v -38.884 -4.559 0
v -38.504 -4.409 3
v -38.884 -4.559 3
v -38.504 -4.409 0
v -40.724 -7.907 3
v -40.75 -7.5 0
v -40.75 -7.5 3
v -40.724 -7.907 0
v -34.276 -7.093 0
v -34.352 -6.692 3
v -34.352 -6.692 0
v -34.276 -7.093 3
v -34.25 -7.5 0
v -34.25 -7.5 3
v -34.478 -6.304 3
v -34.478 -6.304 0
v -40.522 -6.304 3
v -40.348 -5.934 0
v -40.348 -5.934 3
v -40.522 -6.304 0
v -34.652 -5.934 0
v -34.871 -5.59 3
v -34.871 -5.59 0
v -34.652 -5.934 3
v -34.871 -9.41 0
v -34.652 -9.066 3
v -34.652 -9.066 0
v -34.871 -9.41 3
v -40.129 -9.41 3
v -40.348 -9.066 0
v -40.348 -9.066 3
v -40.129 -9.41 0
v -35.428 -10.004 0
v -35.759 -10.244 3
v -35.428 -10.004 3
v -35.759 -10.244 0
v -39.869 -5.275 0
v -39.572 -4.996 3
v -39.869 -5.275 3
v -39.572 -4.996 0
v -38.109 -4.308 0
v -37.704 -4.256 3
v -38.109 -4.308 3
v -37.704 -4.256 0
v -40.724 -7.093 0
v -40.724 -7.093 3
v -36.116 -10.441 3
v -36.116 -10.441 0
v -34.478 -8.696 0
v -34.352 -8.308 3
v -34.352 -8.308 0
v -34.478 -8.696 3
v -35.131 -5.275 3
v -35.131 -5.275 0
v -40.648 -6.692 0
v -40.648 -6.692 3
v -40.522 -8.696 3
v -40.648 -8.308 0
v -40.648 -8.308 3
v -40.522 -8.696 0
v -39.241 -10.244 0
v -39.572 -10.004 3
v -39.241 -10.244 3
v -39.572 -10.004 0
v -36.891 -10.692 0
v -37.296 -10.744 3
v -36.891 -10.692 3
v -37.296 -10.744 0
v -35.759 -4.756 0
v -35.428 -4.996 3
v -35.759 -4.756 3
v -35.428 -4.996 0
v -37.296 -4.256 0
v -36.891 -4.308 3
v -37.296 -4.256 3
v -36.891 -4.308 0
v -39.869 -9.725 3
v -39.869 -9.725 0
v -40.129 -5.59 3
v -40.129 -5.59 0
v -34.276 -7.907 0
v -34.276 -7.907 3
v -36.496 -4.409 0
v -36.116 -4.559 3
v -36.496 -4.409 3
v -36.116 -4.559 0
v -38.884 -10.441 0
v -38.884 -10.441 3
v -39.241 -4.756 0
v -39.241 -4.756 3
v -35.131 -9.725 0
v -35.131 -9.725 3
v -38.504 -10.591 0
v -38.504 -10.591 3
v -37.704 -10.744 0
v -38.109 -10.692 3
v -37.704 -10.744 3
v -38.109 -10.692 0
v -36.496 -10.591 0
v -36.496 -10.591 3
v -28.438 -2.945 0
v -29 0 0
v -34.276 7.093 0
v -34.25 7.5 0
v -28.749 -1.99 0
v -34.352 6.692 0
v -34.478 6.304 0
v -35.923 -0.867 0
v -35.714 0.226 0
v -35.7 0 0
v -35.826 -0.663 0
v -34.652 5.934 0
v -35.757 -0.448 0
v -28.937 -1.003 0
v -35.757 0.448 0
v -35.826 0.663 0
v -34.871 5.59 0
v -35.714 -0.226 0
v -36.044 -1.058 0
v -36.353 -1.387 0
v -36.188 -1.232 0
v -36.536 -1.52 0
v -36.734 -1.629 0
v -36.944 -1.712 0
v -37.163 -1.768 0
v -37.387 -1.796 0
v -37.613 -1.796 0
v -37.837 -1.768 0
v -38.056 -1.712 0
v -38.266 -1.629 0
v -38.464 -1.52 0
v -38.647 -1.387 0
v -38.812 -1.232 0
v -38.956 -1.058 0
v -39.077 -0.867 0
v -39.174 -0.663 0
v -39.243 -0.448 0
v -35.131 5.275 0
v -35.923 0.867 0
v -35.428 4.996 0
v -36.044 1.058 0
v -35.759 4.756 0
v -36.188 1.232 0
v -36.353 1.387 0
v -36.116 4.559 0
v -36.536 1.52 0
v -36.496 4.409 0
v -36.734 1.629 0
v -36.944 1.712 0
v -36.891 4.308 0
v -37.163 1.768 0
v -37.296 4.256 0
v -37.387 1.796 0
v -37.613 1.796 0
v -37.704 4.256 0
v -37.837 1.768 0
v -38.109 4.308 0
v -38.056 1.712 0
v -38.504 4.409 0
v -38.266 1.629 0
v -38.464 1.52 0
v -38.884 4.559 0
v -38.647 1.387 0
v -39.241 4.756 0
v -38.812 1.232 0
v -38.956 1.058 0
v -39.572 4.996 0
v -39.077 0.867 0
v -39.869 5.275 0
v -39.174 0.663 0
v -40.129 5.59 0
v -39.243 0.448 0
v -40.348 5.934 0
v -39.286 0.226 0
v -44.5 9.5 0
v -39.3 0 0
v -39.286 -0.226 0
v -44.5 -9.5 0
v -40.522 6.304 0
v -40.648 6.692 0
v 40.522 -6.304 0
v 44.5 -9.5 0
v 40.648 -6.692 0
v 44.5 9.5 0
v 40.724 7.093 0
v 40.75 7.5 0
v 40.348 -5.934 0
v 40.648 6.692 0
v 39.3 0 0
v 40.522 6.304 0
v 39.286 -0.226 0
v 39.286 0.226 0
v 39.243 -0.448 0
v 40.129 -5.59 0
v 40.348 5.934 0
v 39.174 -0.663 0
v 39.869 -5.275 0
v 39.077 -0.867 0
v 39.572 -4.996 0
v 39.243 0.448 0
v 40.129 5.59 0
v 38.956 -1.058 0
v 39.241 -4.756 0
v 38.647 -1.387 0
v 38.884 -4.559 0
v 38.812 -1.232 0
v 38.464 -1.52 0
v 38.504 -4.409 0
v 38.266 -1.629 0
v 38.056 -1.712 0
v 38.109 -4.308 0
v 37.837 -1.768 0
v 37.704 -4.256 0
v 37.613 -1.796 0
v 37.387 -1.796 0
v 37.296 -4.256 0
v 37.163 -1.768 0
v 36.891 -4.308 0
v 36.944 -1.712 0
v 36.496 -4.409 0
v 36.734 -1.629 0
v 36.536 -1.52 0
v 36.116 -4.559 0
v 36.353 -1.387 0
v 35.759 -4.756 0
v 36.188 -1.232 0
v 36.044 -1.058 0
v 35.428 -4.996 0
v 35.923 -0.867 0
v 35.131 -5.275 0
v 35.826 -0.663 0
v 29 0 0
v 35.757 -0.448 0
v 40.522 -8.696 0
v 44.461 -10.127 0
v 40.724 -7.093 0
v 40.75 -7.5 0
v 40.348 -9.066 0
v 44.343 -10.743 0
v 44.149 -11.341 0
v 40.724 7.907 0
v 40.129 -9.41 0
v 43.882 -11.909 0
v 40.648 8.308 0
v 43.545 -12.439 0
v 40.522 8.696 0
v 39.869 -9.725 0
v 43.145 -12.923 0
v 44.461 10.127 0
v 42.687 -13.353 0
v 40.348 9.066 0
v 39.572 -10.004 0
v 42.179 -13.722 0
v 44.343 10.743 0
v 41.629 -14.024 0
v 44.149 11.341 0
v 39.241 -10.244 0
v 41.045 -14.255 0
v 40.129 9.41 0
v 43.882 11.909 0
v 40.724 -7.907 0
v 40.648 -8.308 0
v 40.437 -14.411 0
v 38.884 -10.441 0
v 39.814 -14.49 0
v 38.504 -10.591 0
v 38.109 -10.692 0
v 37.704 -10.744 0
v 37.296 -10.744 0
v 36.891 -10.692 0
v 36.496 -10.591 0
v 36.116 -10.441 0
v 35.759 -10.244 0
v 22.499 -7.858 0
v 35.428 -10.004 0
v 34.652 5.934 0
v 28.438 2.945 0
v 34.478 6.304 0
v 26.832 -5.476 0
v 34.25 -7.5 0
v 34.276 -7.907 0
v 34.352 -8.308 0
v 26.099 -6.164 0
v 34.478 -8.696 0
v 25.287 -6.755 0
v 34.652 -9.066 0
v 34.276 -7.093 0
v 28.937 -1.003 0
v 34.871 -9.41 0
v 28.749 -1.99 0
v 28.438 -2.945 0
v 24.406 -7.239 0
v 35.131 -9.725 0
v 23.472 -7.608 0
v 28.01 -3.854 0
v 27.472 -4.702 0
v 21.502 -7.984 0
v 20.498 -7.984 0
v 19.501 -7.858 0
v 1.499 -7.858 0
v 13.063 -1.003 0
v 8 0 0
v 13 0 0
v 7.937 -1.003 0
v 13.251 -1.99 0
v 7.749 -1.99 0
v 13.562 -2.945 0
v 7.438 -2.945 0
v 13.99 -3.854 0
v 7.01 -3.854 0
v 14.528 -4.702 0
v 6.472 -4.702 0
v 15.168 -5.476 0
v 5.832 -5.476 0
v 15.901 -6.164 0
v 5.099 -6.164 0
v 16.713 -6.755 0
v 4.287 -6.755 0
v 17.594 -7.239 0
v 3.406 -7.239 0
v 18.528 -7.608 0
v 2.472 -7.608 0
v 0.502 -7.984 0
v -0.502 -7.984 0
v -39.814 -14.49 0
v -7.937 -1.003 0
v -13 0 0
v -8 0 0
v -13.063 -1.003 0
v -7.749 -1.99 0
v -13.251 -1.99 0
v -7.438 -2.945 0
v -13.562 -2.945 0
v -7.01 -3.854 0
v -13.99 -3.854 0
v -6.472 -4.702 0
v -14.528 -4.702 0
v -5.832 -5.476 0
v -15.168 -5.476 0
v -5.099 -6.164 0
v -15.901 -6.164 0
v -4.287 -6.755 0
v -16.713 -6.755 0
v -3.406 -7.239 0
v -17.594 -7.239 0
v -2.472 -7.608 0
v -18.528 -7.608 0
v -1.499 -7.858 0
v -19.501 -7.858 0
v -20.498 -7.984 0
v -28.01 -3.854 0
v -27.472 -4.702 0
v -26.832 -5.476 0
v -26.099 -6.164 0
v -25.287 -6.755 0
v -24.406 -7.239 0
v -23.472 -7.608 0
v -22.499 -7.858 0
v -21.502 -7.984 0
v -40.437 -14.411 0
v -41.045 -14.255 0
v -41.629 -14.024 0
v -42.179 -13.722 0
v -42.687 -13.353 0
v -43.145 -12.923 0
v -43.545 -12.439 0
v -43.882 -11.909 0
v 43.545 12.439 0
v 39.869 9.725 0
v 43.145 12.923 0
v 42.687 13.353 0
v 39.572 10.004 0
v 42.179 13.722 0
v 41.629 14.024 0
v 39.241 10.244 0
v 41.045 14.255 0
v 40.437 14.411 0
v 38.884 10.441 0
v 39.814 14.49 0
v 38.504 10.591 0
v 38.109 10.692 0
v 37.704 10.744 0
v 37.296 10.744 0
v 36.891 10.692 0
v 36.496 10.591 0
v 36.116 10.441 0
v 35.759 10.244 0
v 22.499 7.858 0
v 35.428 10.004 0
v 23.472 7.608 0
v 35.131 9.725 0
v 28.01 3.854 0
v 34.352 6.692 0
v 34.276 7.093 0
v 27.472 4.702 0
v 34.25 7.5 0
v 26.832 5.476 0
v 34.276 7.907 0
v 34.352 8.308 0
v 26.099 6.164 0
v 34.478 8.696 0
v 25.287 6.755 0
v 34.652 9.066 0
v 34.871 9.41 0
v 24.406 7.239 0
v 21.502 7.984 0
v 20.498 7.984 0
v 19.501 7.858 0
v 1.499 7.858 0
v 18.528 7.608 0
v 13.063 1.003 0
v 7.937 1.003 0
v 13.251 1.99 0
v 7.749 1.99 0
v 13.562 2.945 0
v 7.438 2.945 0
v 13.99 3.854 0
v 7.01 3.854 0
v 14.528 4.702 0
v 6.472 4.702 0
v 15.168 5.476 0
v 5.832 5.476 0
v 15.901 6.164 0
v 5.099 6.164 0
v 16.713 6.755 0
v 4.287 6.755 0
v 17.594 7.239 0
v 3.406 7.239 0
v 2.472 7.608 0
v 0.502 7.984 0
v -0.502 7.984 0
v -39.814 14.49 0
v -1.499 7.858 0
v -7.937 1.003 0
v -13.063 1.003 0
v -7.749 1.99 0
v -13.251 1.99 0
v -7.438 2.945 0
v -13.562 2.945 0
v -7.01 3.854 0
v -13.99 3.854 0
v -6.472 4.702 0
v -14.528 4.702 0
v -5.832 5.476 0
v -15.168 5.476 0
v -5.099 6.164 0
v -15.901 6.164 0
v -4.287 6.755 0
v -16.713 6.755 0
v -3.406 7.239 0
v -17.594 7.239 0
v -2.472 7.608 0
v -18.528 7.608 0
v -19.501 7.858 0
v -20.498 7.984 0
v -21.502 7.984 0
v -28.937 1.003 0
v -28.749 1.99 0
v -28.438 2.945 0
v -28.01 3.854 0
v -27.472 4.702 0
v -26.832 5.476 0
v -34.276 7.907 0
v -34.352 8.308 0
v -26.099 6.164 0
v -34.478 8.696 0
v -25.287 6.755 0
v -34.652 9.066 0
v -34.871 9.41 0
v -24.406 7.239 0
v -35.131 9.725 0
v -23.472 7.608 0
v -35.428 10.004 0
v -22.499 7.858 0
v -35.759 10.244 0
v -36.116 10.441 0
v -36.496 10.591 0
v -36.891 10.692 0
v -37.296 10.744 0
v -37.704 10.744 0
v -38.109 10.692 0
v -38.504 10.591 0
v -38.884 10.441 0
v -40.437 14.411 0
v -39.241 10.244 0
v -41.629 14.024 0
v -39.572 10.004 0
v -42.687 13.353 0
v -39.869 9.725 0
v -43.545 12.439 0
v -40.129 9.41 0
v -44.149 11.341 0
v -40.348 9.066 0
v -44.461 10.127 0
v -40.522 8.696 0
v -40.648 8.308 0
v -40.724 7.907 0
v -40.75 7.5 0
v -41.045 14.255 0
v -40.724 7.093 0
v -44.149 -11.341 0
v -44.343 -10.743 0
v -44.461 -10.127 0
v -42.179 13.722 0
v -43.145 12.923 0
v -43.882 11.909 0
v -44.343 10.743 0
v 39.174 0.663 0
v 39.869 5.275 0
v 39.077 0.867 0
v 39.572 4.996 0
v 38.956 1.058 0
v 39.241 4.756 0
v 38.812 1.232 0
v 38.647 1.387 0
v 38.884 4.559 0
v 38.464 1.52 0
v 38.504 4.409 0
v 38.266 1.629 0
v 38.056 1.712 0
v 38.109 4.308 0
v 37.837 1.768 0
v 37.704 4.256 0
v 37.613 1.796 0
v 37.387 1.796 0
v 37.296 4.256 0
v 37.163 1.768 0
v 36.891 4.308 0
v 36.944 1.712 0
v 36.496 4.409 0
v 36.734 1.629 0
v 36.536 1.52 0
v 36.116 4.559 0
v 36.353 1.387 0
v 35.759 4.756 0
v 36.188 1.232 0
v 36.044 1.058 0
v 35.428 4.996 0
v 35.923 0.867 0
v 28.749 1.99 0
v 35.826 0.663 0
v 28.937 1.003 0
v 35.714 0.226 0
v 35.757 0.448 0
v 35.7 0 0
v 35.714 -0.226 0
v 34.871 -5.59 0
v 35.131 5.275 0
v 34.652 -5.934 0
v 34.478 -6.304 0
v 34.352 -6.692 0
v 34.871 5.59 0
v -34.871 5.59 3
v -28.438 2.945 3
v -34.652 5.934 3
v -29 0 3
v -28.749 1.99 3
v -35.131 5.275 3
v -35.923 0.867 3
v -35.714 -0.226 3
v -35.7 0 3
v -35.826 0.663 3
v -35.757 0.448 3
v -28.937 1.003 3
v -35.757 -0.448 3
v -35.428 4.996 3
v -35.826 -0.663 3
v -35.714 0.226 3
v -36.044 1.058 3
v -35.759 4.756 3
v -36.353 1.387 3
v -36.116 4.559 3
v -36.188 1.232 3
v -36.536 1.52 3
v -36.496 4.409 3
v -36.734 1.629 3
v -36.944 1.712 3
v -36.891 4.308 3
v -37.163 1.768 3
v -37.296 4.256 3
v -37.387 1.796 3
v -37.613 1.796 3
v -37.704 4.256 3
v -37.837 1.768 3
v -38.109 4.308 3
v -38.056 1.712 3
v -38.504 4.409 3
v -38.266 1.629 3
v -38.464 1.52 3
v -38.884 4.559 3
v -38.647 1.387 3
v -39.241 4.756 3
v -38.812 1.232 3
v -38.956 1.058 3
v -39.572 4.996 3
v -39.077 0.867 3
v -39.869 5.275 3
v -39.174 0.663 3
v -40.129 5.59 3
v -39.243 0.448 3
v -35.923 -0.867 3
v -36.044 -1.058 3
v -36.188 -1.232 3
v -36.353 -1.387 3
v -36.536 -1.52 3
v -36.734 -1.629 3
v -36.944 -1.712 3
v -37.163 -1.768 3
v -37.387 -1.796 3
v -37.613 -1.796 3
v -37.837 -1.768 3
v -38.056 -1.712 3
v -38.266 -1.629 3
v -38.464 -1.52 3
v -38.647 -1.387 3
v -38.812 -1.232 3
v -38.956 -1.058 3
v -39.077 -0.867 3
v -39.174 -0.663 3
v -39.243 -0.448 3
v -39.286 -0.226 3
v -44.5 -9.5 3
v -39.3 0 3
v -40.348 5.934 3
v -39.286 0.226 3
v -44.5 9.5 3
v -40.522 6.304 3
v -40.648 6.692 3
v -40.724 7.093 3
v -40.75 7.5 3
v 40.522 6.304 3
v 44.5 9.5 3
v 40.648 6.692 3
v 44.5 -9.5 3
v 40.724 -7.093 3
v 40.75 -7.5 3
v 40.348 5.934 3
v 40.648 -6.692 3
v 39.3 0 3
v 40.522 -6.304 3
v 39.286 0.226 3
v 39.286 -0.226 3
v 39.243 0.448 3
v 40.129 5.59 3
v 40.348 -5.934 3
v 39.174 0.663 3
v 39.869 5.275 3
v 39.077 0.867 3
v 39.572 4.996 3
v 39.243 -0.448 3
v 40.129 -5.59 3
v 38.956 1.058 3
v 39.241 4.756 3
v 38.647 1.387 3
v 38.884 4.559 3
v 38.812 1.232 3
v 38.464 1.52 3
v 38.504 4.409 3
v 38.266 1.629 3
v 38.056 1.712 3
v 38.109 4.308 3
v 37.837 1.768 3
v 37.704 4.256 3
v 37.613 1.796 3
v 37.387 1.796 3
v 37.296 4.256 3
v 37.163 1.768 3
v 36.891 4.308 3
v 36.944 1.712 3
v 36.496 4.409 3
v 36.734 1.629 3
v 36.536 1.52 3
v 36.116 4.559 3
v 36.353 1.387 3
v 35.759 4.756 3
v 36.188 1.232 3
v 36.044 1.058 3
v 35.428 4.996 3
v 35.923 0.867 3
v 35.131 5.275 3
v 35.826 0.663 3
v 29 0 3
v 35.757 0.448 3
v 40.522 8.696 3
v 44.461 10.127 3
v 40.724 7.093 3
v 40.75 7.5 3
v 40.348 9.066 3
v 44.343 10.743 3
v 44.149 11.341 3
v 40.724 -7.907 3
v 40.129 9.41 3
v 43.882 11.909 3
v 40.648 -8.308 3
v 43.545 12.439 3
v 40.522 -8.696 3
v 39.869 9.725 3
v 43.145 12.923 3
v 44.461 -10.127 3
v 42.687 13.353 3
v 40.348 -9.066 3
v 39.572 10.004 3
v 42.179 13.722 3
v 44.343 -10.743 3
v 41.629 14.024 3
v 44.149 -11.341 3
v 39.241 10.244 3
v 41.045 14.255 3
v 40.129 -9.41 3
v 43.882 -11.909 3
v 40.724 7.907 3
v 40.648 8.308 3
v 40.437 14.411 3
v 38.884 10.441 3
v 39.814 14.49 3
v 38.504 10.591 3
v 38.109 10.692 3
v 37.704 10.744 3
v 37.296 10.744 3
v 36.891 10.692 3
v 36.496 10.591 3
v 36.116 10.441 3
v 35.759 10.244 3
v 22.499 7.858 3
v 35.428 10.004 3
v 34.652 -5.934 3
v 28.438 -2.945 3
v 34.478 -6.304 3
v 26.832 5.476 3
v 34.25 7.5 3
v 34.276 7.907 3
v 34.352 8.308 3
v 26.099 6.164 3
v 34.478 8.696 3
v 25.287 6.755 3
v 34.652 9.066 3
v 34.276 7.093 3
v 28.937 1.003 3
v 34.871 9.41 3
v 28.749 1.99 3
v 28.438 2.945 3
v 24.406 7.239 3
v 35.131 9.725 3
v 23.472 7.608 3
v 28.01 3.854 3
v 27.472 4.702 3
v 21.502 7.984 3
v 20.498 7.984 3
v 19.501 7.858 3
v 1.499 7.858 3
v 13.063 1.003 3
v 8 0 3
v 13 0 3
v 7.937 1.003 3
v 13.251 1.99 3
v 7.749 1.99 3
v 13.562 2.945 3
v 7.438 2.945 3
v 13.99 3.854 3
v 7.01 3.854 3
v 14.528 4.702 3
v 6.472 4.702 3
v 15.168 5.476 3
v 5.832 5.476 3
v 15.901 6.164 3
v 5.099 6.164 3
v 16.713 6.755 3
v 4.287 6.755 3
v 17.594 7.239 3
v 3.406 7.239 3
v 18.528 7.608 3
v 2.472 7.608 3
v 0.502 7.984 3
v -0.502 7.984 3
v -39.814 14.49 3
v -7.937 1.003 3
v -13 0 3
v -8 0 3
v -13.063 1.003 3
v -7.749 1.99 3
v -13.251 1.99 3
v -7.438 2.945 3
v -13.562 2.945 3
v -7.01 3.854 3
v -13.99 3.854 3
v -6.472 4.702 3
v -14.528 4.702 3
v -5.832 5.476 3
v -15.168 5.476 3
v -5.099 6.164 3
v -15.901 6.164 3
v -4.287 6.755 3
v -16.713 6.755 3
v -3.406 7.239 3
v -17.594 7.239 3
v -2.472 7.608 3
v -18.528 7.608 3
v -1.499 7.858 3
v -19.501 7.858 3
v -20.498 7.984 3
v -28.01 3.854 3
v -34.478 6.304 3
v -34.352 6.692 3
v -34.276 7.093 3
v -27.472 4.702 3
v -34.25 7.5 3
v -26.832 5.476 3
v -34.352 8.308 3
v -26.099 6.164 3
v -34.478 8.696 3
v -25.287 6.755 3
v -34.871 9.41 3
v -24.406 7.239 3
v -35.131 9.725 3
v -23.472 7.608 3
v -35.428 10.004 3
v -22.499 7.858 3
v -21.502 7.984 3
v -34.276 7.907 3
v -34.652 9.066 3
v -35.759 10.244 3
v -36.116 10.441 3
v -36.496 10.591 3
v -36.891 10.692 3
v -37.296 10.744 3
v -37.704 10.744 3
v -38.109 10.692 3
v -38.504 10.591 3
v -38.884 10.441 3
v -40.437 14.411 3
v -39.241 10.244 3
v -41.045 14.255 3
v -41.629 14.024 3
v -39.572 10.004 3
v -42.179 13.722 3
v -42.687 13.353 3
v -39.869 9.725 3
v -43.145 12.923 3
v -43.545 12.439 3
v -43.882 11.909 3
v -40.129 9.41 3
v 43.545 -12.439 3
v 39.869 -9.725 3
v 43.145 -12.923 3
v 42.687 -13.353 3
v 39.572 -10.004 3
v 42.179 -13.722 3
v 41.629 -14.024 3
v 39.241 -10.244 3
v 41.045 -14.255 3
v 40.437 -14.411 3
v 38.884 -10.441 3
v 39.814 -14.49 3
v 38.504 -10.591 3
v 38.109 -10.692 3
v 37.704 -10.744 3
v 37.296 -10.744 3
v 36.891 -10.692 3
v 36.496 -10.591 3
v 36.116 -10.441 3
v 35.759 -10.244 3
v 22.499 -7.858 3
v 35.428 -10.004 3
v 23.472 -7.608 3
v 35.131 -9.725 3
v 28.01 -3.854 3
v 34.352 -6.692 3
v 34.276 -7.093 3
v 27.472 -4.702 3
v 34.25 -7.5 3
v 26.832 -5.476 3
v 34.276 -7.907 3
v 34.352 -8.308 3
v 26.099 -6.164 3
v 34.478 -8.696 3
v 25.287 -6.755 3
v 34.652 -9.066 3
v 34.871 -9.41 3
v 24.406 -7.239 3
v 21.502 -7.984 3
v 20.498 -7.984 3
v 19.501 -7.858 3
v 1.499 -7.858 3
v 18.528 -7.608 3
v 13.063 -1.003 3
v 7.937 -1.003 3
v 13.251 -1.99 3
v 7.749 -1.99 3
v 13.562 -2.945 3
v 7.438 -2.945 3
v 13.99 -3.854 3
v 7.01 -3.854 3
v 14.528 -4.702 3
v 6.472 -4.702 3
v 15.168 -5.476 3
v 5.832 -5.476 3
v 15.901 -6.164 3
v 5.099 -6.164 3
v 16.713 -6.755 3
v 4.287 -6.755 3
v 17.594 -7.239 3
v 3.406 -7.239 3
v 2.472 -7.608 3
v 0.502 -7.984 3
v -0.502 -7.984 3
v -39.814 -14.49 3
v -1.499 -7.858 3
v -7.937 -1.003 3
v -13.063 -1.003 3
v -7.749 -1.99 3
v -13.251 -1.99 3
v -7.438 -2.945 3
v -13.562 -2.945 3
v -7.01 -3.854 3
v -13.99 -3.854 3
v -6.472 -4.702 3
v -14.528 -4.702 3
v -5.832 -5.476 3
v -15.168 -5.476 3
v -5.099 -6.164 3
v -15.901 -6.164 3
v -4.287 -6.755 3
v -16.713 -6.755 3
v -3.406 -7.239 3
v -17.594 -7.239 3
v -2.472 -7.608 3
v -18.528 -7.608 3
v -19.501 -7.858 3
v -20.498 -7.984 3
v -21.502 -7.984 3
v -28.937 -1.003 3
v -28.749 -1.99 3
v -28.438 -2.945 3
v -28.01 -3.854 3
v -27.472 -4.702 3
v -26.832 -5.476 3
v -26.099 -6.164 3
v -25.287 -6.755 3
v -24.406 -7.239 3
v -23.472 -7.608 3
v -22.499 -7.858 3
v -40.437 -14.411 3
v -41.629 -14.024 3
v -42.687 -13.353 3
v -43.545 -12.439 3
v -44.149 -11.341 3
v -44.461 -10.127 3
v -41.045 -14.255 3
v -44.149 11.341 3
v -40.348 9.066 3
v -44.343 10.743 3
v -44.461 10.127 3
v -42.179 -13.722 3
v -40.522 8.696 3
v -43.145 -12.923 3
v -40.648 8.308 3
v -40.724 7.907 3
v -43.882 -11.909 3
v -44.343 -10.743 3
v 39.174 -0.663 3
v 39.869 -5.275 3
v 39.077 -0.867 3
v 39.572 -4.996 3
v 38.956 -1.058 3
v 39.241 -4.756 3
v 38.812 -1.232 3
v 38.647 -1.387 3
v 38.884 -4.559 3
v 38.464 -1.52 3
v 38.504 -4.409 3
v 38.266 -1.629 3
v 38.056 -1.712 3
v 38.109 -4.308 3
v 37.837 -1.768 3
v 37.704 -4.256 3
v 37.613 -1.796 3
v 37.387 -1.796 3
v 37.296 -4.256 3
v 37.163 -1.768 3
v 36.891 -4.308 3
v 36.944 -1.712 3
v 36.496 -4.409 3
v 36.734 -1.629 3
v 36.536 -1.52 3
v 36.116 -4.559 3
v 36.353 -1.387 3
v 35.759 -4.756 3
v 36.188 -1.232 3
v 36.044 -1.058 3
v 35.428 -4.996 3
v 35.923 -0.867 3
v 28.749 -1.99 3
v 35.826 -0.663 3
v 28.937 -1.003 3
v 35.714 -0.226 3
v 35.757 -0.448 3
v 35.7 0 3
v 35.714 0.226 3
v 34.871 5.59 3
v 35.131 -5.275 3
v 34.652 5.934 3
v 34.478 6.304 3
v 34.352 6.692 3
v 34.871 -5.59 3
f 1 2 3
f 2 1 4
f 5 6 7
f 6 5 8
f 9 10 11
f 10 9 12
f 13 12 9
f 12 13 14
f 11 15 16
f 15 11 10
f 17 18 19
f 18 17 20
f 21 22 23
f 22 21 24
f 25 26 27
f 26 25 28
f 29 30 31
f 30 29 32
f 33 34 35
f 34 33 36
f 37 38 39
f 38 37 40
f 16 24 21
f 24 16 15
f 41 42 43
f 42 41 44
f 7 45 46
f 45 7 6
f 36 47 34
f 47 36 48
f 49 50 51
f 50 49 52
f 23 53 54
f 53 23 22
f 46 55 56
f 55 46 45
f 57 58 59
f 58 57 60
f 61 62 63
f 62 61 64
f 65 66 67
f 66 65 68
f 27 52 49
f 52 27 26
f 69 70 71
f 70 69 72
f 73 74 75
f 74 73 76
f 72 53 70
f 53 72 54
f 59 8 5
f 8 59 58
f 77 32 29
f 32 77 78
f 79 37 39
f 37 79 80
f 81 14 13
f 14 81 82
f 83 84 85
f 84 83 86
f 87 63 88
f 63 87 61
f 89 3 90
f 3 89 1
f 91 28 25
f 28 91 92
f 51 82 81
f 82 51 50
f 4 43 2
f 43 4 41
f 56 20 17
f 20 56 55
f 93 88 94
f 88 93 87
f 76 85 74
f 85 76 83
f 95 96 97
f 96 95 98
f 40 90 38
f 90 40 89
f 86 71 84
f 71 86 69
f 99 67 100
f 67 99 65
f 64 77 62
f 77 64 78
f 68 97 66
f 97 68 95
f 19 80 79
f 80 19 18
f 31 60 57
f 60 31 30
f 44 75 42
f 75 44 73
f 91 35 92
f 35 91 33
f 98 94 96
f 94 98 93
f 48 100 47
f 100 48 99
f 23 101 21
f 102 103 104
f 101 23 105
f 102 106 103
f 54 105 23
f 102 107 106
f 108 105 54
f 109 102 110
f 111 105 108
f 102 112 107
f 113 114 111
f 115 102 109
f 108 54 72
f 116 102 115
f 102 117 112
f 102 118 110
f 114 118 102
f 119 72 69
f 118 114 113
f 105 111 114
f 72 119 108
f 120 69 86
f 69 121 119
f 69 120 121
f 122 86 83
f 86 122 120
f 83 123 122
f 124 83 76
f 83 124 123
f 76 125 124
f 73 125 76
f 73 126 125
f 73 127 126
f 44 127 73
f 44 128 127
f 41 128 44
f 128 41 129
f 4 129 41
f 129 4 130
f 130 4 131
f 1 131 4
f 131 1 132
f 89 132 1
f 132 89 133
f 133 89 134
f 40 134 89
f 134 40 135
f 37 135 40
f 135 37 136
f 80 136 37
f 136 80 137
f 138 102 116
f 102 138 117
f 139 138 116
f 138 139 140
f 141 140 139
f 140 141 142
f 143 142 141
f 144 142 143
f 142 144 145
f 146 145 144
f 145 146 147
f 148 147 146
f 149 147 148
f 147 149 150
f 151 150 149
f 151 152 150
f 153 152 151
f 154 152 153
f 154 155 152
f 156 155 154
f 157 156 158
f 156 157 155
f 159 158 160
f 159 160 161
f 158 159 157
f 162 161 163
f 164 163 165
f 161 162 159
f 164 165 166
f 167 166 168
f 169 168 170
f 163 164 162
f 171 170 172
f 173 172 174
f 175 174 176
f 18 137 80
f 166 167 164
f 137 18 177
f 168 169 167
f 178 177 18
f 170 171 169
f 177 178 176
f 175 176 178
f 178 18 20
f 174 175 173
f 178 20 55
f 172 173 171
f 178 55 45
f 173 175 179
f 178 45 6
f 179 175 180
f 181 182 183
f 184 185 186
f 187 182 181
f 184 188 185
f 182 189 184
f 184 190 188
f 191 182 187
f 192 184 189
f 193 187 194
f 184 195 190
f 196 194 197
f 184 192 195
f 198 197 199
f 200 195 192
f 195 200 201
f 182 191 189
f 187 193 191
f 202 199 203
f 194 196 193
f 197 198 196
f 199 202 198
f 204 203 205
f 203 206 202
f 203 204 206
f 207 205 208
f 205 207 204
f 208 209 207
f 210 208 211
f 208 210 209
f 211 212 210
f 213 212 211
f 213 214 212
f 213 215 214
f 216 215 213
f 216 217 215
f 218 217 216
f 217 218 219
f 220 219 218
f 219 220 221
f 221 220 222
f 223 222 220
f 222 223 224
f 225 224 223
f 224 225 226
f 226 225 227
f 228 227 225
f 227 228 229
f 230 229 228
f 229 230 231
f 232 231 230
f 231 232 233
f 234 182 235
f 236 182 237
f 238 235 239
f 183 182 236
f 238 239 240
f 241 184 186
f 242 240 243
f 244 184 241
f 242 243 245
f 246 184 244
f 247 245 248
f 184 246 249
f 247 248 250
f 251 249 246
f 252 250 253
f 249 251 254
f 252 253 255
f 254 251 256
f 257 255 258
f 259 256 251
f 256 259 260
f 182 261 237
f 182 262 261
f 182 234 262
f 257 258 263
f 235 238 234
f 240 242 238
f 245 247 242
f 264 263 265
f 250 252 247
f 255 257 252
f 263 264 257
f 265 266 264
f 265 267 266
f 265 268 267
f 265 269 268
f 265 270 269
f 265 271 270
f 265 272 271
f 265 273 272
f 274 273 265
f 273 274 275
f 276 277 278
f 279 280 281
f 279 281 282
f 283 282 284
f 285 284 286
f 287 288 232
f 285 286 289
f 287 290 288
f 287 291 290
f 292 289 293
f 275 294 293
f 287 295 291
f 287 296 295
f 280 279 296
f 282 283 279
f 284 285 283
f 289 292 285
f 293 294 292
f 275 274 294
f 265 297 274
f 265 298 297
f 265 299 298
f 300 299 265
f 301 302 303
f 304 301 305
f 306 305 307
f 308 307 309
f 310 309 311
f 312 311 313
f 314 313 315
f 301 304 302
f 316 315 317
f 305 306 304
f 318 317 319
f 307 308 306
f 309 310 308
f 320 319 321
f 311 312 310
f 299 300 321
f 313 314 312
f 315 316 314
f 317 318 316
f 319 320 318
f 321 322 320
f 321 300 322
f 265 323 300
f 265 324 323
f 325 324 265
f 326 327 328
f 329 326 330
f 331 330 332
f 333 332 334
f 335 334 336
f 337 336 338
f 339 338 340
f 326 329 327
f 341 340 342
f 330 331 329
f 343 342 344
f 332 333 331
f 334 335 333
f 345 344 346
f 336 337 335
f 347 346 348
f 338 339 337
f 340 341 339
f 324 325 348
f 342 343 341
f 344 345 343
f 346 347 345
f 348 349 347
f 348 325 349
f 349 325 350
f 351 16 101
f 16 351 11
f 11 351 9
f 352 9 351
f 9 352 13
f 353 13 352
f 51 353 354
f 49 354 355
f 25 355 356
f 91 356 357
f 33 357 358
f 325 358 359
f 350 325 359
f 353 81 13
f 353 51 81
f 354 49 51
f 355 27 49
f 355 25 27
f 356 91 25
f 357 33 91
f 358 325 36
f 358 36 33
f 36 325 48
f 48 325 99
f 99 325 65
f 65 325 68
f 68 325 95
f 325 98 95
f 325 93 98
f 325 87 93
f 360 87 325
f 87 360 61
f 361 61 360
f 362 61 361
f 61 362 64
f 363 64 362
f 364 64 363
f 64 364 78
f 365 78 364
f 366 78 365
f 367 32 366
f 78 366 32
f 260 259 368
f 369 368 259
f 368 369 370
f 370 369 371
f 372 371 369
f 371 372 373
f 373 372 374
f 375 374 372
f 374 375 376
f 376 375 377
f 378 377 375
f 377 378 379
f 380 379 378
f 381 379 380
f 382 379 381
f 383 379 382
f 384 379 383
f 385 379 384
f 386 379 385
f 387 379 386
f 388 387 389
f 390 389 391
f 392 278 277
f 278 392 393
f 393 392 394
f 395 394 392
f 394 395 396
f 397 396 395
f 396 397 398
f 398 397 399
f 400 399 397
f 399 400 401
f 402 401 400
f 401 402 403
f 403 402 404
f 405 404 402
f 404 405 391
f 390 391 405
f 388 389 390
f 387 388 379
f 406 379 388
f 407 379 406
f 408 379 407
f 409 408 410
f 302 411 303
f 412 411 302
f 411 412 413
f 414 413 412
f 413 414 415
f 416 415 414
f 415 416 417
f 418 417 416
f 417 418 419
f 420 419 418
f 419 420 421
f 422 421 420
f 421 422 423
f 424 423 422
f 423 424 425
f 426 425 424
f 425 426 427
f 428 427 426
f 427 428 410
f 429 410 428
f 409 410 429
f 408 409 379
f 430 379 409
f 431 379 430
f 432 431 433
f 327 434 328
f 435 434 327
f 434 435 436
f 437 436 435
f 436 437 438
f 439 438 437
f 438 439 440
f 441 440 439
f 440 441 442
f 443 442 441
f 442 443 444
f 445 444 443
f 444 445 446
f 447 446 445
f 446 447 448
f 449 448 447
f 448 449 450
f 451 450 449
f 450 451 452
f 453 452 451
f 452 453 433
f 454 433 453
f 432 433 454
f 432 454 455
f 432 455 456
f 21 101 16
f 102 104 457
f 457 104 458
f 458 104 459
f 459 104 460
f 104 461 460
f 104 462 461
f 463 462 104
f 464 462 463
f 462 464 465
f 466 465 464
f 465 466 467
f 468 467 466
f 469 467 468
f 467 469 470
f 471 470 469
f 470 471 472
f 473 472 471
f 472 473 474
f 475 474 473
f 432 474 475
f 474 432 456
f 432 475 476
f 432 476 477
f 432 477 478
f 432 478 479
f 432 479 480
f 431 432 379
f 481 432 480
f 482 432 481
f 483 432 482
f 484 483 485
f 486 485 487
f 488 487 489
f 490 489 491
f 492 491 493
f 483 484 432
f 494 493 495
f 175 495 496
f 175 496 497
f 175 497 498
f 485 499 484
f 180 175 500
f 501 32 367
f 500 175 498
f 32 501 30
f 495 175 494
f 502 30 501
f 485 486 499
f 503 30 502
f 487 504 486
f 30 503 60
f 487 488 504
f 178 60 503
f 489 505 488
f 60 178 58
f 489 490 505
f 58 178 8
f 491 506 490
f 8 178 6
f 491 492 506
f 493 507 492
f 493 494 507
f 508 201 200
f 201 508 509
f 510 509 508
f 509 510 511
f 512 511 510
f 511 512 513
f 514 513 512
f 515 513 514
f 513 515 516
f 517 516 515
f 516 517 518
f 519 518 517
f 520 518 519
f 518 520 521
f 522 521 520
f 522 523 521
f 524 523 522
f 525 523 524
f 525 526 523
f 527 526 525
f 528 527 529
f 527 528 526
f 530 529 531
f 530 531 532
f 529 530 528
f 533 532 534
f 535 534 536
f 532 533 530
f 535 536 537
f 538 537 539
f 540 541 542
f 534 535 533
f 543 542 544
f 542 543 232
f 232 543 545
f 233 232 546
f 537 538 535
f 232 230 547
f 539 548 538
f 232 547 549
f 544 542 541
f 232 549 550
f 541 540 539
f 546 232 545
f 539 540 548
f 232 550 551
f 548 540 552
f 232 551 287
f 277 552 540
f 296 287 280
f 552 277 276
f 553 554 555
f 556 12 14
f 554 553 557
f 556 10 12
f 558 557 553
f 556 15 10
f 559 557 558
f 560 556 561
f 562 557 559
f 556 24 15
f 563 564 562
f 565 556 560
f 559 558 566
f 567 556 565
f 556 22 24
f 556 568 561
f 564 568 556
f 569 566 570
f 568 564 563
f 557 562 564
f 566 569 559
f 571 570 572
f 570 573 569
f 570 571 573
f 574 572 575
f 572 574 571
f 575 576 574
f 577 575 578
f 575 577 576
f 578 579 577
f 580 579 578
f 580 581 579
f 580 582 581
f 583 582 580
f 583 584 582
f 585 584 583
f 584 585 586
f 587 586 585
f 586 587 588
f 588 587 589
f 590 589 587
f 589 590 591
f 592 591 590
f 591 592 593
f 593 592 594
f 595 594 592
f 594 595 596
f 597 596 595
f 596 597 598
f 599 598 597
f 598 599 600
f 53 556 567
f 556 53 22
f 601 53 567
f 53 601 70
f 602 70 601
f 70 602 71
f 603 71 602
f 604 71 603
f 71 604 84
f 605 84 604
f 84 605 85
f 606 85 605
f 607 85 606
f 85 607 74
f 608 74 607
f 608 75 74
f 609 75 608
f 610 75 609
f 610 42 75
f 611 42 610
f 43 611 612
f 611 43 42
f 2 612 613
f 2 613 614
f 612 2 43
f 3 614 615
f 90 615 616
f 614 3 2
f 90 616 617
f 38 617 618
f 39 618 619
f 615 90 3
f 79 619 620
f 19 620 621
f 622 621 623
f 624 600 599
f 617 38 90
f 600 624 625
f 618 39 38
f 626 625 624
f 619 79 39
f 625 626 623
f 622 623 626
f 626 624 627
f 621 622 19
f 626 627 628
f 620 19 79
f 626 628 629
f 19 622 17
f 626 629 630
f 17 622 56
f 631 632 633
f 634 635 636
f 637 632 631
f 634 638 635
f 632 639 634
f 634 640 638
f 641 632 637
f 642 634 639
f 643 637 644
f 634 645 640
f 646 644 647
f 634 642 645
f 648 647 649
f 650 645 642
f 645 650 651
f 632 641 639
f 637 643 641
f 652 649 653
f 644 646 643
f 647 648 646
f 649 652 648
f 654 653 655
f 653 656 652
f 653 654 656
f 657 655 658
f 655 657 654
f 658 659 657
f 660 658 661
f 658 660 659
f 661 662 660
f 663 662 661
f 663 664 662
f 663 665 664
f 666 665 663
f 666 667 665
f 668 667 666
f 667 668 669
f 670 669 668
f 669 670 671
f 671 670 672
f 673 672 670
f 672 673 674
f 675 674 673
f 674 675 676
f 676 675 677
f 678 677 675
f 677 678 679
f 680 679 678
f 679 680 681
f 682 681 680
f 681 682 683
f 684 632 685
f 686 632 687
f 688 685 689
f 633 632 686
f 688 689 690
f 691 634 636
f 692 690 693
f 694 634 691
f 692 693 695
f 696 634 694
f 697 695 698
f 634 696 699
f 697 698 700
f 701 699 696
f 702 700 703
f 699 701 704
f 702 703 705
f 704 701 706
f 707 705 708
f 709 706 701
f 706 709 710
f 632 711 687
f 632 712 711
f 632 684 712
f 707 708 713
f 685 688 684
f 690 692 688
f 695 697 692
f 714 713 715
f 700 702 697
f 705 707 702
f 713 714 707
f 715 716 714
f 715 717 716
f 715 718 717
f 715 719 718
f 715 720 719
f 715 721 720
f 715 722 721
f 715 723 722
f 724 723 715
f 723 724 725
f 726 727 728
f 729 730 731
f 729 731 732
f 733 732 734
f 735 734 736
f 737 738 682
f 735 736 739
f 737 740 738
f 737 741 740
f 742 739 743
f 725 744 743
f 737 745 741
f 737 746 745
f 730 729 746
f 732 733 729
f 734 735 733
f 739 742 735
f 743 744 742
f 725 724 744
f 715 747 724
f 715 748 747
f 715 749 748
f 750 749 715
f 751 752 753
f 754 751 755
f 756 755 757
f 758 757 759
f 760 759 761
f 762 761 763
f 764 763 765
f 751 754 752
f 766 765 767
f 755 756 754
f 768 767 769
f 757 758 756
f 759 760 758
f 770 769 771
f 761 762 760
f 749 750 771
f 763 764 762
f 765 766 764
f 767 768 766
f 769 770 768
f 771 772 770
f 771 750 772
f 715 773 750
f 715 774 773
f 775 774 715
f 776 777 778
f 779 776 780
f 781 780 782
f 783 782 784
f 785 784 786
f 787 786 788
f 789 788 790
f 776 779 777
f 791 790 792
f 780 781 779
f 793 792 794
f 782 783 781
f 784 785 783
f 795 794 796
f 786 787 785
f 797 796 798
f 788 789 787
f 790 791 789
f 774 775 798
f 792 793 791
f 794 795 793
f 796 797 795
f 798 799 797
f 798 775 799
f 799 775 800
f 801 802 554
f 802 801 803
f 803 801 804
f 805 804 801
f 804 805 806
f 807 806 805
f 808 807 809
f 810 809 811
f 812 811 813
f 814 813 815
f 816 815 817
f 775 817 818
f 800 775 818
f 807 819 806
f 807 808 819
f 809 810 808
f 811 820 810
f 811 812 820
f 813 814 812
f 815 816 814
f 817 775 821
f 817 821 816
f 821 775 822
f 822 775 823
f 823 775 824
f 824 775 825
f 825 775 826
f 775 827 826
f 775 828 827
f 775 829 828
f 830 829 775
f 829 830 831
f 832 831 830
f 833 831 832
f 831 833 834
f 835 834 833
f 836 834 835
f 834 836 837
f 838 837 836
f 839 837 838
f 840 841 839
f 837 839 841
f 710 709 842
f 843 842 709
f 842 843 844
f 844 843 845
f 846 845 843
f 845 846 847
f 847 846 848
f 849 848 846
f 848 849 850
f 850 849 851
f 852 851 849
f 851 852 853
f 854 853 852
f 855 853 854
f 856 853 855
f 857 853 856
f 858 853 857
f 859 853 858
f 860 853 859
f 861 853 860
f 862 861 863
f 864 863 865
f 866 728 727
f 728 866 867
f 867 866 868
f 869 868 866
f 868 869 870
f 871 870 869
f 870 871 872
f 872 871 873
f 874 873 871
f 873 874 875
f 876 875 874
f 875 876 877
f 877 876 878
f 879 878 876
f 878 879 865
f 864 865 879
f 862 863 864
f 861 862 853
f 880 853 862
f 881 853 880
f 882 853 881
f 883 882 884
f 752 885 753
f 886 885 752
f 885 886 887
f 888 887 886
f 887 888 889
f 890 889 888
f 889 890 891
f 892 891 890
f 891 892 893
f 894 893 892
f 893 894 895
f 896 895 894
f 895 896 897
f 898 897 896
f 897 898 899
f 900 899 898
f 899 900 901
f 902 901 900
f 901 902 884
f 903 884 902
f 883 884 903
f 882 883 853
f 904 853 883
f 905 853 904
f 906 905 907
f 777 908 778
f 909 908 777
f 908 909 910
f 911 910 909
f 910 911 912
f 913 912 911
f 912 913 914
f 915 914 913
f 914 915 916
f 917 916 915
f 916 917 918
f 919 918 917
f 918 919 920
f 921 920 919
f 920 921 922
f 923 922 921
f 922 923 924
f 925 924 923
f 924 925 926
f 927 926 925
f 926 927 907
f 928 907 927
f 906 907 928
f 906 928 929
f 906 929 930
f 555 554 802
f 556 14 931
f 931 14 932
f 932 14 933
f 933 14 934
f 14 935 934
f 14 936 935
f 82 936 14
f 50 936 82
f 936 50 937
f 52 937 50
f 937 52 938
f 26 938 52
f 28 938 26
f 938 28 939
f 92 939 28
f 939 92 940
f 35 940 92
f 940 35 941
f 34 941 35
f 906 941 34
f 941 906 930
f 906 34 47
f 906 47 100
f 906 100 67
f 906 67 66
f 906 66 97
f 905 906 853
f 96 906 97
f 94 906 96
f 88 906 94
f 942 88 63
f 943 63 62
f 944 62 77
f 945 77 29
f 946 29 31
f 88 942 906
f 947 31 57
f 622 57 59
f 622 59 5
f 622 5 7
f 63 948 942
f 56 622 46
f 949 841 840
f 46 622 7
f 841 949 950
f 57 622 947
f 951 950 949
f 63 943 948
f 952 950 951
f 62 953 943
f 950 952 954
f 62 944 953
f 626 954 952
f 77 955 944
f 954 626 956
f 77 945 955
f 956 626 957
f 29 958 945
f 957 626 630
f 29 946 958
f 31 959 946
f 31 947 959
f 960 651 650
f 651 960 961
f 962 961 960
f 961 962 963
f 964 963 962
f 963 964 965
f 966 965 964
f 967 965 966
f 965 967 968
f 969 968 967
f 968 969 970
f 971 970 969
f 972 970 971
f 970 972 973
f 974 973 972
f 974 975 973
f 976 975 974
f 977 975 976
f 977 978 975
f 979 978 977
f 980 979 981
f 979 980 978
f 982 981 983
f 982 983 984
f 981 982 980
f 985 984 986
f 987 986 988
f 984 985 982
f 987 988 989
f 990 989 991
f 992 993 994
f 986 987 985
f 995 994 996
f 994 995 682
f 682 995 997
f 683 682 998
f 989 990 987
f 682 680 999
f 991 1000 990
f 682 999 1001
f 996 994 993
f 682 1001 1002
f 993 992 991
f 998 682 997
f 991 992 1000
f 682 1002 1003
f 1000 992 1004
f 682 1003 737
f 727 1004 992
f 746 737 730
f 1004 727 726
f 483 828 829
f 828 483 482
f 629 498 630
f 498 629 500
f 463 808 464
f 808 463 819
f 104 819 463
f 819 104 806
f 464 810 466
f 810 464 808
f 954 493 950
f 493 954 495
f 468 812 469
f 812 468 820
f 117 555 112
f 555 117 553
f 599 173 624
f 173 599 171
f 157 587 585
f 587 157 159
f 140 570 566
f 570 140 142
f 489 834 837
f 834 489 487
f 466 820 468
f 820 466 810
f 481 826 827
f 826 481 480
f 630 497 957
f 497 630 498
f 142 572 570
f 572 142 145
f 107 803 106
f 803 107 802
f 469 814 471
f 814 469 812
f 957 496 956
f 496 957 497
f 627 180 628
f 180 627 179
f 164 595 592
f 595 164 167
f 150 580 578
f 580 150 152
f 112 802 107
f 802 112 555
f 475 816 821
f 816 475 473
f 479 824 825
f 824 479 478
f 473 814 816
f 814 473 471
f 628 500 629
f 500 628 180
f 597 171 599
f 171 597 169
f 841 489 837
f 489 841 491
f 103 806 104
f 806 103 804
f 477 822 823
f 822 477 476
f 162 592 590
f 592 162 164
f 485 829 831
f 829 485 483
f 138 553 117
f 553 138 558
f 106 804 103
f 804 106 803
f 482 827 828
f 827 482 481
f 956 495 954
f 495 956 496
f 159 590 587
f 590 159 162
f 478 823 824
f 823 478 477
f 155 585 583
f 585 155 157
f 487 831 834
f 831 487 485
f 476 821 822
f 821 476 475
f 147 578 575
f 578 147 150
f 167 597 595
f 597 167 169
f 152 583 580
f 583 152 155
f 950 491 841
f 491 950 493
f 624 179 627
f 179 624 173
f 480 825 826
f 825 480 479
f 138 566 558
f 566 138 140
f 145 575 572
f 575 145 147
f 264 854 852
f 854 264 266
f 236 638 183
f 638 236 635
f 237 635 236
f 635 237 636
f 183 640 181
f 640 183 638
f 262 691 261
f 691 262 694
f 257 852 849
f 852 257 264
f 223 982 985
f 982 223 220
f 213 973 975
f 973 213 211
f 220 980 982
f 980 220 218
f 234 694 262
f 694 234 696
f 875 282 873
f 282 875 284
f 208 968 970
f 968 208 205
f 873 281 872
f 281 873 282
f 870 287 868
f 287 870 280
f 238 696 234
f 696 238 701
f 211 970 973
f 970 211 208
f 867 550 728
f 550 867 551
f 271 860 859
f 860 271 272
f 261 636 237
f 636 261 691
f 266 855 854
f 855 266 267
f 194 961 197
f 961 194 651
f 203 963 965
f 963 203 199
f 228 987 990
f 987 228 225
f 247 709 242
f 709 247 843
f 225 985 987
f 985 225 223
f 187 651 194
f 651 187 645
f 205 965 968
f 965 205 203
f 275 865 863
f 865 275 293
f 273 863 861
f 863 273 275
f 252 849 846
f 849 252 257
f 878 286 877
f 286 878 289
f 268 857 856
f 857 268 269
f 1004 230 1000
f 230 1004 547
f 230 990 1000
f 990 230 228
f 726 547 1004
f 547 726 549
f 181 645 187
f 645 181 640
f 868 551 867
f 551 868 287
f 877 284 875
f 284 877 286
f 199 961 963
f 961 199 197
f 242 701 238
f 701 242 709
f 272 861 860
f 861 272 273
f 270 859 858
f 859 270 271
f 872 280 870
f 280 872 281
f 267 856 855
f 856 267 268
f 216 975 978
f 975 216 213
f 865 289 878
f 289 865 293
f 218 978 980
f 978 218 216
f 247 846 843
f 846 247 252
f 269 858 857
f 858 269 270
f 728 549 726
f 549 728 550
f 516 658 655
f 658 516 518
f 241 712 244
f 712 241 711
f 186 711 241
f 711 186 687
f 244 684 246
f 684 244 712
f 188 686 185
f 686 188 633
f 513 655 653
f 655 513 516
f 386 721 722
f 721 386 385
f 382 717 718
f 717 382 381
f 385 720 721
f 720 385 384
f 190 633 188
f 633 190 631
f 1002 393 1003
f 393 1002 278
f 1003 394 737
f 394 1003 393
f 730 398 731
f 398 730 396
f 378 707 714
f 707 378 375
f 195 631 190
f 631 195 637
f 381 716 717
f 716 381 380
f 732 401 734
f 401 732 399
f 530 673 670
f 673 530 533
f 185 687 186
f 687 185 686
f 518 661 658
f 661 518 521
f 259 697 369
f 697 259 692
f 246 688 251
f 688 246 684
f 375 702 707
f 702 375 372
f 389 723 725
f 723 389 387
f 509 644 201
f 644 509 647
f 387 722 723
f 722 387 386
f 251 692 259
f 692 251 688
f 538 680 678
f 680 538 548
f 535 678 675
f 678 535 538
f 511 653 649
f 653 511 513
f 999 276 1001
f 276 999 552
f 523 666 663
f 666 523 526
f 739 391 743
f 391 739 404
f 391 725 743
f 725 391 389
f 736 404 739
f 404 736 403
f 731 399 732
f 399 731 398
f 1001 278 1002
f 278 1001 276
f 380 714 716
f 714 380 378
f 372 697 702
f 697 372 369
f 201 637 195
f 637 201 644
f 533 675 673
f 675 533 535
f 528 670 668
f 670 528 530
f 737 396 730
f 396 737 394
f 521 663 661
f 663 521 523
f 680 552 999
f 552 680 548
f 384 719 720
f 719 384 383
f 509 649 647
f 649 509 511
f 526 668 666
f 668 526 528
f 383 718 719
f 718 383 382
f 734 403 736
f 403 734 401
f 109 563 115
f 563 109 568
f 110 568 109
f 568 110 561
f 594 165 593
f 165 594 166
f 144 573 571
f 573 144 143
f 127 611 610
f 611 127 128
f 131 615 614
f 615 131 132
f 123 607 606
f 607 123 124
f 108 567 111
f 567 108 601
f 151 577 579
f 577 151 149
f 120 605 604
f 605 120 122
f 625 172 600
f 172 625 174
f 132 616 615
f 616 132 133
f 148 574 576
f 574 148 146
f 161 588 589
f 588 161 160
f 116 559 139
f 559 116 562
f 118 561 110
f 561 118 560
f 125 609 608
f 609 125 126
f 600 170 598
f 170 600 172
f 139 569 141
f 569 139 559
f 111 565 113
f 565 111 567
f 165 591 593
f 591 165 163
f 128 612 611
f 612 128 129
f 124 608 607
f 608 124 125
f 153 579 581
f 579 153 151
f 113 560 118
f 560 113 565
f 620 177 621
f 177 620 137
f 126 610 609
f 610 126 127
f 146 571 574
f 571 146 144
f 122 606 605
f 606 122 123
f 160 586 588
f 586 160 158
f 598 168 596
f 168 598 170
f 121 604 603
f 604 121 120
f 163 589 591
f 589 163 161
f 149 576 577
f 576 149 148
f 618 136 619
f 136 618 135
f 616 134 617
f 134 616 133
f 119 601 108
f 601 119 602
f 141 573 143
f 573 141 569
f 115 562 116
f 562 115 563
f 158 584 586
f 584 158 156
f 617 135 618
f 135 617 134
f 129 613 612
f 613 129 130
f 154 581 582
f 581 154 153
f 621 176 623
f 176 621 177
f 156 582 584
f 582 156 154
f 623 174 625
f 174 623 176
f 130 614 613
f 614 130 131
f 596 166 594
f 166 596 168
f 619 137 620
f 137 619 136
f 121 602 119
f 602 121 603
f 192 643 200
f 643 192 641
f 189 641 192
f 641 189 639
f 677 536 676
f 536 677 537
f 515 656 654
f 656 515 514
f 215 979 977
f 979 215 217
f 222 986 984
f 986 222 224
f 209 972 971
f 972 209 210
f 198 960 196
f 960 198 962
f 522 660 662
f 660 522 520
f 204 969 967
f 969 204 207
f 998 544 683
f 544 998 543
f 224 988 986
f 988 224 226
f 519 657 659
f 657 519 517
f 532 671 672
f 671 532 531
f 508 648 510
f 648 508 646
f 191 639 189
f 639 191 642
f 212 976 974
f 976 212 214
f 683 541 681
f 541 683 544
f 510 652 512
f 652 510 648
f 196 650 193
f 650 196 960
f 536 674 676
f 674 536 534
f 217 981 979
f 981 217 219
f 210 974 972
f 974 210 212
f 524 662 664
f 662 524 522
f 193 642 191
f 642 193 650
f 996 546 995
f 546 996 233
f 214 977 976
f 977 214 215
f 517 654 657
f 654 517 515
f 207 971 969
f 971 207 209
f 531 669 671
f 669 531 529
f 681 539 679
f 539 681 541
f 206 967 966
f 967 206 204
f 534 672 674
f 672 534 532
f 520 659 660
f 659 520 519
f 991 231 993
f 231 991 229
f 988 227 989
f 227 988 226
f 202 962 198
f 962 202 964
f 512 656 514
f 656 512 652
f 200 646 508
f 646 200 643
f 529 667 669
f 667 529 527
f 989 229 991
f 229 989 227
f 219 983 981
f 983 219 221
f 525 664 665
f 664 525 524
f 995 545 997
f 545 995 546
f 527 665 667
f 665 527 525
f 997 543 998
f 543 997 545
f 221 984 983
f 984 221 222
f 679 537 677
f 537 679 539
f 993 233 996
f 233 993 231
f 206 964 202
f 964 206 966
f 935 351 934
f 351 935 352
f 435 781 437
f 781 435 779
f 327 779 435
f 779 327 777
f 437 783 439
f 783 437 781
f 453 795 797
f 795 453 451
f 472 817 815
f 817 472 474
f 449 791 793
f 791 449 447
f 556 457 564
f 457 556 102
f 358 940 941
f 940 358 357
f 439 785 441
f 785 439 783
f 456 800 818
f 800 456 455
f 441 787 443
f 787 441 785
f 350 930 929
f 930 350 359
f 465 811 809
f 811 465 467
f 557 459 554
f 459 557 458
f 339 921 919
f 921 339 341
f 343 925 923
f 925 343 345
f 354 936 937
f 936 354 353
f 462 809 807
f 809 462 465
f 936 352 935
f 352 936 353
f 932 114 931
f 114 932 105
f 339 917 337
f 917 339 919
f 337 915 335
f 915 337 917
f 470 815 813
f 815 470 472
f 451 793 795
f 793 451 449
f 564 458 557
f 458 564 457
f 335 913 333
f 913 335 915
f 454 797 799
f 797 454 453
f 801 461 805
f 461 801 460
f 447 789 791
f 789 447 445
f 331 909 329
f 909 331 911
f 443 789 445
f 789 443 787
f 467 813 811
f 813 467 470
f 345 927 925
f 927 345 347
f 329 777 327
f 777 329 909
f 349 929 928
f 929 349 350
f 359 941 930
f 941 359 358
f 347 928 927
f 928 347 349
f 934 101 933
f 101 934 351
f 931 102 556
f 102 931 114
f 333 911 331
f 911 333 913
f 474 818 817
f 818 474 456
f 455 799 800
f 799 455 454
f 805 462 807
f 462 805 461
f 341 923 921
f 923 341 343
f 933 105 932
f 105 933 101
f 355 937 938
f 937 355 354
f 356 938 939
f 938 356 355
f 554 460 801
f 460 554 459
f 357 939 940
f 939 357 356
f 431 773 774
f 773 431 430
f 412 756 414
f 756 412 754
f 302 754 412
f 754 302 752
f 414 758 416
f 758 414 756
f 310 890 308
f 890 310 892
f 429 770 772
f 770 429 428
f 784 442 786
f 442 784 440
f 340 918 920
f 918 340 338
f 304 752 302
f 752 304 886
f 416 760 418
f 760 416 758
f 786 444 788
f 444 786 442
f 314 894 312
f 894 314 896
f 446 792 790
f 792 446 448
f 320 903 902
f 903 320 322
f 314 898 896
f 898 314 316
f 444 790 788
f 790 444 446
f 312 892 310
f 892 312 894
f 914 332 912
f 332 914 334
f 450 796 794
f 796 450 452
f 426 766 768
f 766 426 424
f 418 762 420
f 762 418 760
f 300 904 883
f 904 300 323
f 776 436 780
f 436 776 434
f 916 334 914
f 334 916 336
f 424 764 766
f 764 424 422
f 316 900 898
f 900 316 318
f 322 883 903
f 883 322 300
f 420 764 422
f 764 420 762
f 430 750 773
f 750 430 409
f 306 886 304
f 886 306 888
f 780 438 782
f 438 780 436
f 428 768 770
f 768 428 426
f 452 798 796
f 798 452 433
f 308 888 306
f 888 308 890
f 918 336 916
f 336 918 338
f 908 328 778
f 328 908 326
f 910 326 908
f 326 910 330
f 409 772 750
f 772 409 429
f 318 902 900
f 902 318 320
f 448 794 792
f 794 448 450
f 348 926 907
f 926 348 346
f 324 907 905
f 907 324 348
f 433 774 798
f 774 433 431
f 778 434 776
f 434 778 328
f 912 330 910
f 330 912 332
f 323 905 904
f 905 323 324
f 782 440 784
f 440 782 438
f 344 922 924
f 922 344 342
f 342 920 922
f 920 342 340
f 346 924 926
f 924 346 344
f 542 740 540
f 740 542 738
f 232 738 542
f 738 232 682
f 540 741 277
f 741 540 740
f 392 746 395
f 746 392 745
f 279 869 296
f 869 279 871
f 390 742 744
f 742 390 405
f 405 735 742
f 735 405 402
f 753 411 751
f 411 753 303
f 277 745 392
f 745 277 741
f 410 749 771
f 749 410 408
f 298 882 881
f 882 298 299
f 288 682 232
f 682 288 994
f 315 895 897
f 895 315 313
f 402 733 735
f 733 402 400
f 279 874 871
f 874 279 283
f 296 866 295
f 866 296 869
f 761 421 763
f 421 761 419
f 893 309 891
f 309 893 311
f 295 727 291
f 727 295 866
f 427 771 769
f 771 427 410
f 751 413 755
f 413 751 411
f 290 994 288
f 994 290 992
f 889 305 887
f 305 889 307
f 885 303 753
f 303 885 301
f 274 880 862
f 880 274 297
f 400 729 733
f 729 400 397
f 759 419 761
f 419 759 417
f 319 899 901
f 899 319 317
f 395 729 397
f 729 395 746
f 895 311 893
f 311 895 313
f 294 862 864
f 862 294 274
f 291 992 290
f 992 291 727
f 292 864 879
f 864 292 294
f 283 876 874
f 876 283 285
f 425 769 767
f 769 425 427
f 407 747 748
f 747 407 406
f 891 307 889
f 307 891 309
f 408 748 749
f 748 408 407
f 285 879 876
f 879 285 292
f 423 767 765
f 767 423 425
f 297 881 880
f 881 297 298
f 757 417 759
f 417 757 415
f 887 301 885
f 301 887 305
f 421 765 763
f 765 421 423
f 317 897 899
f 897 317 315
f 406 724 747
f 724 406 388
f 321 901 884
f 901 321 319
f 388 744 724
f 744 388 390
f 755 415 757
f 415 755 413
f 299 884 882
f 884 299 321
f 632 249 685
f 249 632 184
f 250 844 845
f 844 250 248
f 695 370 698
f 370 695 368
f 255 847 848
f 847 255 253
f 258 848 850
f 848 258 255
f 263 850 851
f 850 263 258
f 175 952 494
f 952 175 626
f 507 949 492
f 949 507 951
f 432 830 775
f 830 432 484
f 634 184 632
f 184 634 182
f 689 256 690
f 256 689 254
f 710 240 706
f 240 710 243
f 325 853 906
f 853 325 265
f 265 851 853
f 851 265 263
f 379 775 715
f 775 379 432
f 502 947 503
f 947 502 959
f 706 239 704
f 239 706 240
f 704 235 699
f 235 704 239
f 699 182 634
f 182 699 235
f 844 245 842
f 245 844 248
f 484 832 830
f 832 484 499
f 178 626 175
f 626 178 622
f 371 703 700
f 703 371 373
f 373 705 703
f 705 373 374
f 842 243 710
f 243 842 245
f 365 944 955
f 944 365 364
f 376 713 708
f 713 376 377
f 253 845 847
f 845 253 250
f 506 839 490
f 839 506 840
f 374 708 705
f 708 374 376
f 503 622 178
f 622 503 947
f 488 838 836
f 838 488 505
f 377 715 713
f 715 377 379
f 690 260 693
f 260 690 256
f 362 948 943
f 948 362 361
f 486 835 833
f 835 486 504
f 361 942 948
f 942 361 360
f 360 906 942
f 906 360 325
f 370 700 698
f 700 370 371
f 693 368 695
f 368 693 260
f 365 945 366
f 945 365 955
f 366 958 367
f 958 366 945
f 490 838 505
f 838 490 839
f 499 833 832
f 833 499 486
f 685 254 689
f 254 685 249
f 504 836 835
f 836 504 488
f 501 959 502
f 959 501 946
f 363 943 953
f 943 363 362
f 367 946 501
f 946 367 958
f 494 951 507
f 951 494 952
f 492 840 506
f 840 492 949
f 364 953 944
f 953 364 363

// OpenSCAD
$fn = 50;

difference() {
	union() {
		hull() {
			translate(v = [-39.5, 9.5, 0]) {
				cylinder(h = 3, r = 5);
			}
			translate(v = [39.5, 9.5, 0]) {
				cylinder(h = 3, r = 5);
			}
			translate(v = [-39.5, -9.5, 0]) {
				cylinder(h = 3, r = 5);
			}
			translate(v = [39.5, -9.5, 0]) {
				cylinder(h = 3, r = 5);
			}
		}
	}
	union() {
		translate(v = [-37.5, -7.5, 0]) {
			cylinder(h = 3, r = 3.25);
		}
		translate(v = [-37.5, 7.5, 0]) {
			cylinder(h = 3, r = 3.25);
		}
		translate(v = [37.5, -7.5, 0]) {
			cylinder(h = 3, r = 3.25);
		}
		translate(v = [37.5, 7.5, 0]) {
			cylinder(h = 3, r = 3.25);
		}
		translate(v = [-37.5, 0.0, 0]) {
			cylinder(h = 3, r = 1.8);
		}
		translate(v = [37.5, 0.0, 0]) {
			cylinder(h = 3, r = 1.8);
		}
		translate(v = [-21.0, 0, 0.0]) {
			cylinder(h = 3, r = 8.0);
		}
		cylinder(h = 3, r = 8.0);
		translate(v = [21.0, 0, 0.0]) {
			cylinder(h = 3, r = 8.0);
		}
	}
}
